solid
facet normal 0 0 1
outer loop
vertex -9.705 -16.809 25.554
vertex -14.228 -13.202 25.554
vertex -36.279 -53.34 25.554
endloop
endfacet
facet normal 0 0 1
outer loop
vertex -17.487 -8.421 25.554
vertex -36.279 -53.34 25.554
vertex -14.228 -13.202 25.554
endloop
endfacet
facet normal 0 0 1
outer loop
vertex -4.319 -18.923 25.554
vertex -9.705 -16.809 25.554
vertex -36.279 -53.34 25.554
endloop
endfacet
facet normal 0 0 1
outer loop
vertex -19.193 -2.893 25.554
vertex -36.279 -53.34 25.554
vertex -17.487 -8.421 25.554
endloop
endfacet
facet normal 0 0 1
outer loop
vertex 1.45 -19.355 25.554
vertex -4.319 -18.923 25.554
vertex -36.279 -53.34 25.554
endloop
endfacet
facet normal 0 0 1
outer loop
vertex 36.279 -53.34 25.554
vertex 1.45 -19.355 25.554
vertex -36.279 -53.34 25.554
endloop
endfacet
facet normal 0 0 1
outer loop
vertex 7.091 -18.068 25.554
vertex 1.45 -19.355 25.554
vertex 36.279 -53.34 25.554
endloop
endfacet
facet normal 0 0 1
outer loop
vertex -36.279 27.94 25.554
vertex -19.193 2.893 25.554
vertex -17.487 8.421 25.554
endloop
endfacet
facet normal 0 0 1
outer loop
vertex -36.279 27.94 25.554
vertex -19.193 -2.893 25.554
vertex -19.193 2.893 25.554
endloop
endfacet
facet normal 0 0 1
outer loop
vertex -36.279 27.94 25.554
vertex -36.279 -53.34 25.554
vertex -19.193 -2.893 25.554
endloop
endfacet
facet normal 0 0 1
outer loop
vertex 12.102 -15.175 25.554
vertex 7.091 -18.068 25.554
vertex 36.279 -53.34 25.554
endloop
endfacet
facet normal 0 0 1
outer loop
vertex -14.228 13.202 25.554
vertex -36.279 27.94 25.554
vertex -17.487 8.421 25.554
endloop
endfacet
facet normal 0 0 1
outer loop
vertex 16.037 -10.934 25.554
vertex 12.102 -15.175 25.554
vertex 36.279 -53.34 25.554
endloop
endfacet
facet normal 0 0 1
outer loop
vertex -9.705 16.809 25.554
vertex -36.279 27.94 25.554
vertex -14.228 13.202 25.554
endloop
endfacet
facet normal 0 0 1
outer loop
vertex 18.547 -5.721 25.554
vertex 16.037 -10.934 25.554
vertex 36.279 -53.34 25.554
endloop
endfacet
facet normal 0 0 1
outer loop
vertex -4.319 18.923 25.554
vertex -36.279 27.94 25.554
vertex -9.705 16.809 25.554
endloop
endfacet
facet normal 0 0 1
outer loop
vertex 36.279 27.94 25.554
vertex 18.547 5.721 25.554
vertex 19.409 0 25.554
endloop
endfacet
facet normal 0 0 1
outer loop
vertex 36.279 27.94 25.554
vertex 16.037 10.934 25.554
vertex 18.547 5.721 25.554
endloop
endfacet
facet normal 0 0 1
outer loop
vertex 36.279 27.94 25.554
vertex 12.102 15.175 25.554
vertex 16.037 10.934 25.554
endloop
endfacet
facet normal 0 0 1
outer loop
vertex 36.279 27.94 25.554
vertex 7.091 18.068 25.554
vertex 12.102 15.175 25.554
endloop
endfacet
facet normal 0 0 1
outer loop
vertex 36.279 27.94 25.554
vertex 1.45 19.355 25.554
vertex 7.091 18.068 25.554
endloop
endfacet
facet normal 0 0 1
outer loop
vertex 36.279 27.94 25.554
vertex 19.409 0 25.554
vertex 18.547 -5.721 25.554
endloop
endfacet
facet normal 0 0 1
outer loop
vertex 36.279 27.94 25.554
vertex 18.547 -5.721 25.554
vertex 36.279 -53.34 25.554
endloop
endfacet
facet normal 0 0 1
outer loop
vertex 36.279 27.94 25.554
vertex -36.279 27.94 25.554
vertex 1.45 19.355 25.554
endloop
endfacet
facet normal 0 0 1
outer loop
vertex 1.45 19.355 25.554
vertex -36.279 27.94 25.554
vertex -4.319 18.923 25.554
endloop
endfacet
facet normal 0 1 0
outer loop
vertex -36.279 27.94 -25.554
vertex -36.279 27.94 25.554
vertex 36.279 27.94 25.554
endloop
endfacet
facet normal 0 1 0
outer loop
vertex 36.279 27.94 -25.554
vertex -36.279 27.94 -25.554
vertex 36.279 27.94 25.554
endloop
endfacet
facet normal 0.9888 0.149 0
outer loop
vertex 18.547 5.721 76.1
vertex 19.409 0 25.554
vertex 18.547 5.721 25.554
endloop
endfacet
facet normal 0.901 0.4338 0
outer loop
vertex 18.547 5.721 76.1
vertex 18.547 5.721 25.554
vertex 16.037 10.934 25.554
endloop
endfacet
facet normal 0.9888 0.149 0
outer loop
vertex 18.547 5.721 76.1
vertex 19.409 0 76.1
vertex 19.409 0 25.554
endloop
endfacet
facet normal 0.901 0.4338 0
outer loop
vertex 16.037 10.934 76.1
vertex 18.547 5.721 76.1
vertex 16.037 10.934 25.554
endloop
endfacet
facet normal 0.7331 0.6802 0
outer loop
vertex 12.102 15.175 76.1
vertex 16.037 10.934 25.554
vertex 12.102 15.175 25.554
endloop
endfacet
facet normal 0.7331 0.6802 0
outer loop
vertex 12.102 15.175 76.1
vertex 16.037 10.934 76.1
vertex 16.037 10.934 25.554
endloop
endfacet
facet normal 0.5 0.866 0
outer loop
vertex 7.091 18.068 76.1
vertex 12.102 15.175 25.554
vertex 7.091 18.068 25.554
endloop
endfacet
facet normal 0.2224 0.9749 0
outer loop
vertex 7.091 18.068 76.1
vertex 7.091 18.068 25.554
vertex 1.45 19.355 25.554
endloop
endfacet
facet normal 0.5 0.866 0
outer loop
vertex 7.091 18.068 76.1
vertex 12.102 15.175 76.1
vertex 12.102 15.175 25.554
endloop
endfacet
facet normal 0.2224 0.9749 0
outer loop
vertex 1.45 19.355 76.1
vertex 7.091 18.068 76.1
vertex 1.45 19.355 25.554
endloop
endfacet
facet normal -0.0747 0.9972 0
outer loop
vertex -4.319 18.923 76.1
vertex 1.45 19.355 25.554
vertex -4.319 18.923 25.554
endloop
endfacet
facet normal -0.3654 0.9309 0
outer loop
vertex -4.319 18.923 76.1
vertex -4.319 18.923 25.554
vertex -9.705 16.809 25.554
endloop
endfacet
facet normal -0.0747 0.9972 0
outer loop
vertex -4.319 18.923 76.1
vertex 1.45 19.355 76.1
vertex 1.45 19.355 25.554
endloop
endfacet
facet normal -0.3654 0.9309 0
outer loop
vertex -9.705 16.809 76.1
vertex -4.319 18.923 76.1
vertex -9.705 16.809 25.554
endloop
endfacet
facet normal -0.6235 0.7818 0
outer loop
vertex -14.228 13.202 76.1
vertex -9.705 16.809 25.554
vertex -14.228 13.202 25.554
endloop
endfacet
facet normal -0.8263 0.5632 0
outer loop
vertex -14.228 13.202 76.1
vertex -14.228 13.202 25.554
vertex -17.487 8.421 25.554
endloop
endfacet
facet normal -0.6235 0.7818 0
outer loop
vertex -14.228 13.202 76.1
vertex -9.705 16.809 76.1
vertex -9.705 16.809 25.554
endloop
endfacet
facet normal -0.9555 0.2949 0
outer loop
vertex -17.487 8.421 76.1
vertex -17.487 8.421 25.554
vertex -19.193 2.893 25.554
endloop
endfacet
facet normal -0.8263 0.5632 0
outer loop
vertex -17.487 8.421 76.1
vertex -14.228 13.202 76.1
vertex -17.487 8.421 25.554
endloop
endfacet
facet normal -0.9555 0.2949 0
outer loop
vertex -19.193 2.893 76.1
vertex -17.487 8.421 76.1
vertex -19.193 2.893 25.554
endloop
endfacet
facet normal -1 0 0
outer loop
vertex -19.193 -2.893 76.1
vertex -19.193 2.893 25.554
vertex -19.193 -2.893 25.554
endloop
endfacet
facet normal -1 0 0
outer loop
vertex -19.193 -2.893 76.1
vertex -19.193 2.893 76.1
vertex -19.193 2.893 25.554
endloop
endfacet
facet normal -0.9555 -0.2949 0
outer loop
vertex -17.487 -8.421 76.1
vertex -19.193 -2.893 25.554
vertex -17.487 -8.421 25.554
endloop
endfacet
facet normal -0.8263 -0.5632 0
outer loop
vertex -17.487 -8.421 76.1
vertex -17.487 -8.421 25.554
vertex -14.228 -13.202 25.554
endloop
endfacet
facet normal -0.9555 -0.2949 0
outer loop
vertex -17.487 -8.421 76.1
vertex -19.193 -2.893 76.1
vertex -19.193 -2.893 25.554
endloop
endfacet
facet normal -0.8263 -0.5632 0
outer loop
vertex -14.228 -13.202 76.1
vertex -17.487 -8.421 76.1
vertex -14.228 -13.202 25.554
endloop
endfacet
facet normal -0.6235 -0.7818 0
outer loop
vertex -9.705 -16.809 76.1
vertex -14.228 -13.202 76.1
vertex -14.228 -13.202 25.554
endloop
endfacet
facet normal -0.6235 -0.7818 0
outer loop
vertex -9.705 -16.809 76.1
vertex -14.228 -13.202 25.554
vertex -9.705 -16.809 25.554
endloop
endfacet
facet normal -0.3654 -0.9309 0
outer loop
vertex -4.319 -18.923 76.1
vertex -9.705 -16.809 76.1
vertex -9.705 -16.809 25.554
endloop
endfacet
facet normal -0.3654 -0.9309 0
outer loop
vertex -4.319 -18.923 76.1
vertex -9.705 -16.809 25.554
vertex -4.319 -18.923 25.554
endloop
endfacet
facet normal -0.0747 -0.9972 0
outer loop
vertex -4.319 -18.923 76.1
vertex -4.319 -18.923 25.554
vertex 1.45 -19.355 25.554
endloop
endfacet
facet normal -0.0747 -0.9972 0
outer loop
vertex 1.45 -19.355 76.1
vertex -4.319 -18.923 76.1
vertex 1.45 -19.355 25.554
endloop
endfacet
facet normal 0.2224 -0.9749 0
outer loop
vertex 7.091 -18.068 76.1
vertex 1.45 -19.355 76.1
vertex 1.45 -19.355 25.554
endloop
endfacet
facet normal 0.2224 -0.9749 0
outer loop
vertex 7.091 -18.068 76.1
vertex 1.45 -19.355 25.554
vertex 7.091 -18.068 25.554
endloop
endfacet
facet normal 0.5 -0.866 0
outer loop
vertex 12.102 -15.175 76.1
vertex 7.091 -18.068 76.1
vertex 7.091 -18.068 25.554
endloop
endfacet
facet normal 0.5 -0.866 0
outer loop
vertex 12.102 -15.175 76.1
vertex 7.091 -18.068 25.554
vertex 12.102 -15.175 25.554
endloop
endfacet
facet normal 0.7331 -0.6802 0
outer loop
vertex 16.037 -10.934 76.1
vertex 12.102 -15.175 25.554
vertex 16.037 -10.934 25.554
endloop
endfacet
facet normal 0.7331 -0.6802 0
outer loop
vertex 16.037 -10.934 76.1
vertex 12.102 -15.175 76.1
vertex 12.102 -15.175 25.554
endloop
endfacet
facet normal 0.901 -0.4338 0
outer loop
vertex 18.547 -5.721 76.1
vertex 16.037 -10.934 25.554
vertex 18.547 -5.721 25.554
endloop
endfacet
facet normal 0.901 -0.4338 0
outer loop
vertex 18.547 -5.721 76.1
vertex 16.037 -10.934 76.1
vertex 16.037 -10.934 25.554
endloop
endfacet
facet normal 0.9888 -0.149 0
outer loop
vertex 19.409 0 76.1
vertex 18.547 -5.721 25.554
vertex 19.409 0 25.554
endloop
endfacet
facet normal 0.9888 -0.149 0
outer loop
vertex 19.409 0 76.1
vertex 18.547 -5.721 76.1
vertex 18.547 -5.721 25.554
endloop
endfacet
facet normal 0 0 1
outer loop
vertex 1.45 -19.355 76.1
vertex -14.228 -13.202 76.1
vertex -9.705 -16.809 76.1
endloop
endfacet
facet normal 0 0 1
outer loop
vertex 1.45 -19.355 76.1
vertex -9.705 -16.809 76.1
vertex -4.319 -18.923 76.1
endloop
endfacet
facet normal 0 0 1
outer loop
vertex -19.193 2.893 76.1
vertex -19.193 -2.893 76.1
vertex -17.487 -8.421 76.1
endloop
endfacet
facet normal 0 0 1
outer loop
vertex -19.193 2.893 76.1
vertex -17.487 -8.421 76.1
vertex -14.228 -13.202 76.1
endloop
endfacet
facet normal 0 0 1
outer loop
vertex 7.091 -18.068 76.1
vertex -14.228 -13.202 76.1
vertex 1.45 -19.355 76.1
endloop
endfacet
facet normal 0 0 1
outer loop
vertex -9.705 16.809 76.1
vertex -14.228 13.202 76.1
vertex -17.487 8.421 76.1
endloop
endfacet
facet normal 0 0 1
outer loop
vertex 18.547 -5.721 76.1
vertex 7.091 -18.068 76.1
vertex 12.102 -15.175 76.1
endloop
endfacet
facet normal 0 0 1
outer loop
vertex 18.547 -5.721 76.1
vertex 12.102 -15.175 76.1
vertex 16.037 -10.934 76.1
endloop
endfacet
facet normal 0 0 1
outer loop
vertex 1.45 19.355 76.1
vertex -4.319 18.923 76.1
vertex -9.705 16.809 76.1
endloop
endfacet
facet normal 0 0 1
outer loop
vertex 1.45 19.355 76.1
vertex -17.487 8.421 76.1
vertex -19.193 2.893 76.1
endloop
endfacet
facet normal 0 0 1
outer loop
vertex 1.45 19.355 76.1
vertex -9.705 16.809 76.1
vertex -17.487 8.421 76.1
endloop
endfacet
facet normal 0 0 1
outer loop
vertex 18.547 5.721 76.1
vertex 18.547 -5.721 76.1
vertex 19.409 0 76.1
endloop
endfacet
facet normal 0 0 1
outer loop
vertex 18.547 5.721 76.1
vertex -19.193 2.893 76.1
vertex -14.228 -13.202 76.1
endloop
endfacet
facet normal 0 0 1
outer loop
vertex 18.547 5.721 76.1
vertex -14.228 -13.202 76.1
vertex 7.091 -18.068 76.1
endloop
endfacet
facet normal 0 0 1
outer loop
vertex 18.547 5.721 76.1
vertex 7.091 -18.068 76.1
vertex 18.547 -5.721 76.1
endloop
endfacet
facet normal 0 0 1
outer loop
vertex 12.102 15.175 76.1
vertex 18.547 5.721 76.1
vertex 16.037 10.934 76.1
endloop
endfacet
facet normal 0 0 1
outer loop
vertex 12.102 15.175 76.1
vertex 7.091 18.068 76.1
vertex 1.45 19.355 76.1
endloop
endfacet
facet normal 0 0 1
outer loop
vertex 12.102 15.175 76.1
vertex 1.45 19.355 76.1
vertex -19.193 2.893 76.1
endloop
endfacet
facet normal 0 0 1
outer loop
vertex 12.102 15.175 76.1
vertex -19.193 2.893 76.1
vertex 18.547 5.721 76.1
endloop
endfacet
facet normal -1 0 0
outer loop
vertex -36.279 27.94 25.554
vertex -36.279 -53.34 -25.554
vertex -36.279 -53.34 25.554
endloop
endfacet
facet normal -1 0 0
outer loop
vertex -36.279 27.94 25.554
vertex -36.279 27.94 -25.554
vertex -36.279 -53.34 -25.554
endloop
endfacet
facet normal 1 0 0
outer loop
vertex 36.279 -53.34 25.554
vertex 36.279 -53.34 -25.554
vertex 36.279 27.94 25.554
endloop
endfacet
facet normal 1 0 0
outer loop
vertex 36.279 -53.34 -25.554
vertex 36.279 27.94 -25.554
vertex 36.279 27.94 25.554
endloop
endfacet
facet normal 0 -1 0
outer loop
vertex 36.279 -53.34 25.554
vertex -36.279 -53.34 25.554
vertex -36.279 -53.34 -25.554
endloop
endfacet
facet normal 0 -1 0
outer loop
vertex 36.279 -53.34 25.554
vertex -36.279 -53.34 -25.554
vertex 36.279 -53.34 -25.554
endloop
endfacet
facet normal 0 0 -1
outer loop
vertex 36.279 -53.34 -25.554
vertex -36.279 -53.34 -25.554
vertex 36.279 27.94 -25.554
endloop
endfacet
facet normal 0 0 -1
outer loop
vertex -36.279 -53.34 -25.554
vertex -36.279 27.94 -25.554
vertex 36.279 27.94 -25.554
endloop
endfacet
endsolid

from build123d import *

# Parameters (mm, degrees)
F0_W     = 72.5571736693
F0_H     = 51.1083565652
F1_DEPTH = 27.94
F2_R     = 19.4094724008
F3_DEPTH = 50.546
F4_DEPTH = 25.4


with BuildPart() as f1:
    # F0 (on Front) → F1 (new body, symmetric)
    with BuildSketch(Plane.XZ):
        Rectangle(F0_W, F0_H)
    extrude(amount=F1_DEPTH, both=True)

    # F2 (on face) → F3 (join, symmetric)
    with BuildSketch(Plane.XY.offset(25.5541782826)):
        Circle(F2_R)
    extrude(amount=F3_DEPTH, both=True)

    # F4 (add): a face of the model
    f4_faces = [f1.faces().sort_by_distance(p)[0] for p in [
        (0, -27.94, 0),
    ]]
    extrude(f4_faces, amount=F4_DEPTH)


solid = f1.part
